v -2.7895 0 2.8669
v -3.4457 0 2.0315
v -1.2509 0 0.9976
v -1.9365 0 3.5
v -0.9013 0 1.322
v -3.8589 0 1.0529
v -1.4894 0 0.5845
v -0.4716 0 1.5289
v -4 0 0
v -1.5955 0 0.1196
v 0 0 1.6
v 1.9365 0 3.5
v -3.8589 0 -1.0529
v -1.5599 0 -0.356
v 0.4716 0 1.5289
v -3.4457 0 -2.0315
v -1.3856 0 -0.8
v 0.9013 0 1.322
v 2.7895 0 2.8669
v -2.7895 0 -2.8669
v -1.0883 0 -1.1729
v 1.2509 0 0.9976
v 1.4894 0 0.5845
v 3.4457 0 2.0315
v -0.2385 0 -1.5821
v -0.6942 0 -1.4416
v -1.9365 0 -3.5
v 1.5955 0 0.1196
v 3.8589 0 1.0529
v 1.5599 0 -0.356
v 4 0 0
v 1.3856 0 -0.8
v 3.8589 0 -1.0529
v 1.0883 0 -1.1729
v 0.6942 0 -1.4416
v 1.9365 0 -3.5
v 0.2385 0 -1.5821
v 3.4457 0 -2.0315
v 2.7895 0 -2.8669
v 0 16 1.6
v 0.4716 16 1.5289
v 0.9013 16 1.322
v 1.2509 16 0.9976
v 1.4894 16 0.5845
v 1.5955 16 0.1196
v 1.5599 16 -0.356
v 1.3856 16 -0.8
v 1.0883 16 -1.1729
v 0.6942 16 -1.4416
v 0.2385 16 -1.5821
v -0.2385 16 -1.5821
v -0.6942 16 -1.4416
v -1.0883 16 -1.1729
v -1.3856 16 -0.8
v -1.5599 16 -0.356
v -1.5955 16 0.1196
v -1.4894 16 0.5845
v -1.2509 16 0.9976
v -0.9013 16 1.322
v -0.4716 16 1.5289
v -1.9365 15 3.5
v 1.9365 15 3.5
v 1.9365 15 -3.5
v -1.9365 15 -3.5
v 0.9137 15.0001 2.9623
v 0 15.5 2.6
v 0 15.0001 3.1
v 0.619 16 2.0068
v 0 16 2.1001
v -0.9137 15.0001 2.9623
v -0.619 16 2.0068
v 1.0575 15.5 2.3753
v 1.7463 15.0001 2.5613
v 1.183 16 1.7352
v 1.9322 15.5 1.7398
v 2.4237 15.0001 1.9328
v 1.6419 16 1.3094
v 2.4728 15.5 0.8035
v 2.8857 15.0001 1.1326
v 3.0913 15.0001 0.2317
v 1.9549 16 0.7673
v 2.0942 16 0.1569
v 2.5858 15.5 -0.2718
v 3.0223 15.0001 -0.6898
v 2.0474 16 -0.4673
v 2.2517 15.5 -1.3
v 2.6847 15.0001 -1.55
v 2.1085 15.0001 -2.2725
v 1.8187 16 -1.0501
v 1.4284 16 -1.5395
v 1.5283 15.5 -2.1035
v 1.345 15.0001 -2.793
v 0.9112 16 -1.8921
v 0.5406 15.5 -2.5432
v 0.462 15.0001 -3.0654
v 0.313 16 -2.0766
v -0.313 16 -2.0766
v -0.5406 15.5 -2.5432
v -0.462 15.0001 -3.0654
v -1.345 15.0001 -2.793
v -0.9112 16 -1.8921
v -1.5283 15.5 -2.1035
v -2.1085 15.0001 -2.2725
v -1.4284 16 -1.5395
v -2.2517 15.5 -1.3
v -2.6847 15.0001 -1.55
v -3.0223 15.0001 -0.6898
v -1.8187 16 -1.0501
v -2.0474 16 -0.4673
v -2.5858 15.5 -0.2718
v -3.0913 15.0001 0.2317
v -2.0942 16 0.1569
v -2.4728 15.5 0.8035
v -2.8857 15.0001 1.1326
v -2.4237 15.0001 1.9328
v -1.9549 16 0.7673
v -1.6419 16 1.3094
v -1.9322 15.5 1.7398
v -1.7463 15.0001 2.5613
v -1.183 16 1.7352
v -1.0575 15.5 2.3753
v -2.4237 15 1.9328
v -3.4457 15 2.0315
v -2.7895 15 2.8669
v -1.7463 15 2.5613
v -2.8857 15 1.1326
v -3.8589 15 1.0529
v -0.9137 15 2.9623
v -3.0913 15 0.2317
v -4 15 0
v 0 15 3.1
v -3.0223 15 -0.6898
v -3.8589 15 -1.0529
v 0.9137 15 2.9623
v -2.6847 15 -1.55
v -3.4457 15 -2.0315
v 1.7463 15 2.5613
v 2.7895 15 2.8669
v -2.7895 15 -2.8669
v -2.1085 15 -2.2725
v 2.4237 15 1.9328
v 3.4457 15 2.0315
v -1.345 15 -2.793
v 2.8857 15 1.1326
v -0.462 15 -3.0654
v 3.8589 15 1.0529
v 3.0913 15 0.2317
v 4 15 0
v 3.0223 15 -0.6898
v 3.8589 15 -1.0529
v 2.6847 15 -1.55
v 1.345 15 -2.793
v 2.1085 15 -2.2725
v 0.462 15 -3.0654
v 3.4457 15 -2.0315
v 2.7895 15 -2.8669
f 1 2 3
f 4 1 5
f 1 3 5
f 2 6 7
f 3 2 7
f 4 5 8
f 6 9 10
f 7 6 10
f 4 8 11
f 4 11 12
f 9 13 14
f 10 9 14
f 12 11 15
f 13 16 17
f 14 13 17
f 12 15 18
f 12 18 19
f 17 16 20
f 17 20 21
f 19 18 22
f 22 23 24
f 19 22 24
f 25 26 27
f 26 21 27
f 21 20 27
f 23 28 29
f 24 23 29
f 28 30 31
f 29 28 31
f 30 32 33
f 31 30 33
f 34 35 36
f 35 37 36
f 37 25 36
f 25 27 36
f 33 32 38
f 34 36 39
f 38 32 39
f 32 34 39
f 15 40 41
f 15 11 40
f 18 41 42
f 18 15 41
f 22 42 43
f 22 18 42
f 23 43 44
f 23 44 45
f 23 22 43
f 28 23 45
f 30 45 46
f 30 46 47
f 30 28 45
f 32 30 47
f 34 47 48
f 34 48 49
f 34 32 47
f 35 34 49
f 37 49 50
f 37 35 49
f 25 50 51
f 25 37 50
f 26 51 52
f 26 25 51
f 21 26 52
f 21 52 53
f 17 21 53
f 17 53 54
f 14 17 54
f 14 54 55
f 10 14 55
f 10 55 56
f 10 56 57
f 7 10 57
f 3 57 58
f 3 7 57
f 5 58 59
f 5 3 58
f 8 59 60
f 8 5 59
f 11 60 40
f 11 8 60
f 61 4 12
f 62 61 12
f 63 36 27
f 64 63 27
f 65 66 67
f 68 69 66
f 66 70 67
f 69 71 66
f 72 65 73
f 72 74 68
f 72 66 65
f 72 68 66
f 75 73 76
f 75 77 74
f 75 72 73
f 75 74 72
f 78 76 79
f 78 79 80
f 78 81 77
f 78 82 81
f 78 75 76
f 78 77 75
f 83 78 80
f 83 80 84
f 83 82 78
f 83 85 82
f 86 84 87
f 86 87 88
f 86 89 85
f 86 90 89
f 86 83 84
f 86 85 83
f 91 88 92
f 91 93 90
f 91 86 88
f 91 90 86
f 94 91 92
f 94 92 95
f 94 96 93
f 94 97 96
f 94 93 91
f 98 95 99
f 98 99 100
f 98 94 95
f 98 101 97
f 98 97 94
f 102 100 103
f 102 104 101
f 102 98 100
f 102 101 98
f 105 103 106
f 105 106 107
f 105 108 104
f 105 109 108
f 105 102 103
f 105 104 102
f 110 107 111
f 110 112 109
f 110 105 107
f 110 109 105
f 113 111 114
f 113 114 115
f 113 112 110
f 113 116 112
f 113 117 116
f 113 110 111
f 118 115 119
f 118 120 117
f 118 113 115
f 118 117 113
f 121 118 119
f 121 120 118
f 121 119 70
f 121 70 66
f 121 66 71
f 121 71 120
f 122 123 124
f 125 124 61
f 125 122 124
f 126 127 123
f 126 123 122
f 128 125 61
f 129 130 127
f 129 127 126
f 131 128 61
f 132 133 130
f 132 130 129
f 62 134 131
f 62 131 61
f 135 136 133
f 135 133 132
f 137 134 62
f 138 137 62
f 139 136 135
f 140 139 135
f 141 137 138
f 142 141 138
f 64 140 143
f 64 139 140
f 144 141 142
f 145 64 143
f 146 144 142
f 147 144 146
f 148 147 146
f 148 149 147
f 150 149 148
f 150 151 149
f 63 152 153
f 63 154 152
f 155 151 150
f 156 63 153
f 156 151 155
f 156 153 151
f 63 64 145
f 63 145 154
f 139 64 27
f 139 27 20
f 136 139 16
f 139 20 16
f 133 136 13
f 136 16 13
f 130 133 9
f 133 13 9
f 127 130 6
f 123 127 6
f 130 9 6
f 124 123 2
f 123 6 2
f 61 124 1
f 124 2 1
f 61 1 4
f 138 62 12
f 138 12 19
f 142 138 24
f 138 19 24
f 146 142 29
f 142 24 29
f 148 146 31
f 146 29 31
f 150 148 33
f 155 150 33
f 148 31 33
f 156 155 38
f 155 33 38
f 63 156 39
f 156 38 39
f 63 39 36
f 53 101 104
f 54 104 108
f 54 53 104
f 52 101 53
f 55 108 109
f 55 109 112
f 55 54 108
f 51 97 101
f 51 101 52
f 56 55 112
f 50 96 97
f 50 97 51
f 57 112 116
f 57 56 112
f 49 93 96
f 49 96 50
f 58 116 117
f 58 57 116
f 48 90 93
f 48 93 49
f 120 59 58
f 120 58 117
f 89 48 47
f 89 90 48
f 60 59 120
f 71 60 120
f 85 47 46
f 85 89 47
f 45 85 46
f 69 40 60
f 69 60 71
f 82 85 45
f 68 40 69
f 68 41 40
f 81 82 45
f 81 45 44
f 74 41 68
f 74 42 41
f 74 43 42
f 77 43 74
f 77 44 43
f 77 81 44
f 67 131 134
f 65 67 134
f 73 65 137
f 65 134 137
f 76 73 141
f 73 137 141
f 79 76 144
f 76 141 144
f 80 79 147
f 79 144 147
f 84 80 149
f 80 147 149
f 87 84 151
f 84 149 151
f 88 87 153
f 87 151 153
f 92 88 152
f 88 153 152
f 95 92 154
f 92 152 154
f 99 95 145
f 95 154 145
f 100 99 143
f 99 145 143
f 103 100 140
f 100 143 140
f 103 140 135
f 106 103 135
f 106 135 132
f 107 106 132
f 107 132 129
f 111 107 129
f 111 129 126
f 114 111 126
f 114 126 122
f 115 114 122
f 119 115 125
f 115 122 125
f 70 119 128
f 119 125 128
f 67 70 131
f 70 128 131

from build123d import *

# Parameters (mm, degrees)
SKETCH1_R           = 1.6
BOSS_EXTRUDE1_DEPTH = 15
SKETCH2_R           = 3.1
SKETCH2_R_2         = 1.6
BOSS_EXTRUDE2_DEPTH = 1
CHAMFER1_SIZE       = 1


with BuildPart() as part:
    # Sketch1 → Boss-Extrude1 (new body)
    with BuildSketch(Plane(origin=(0, 0, 0), x_dir=(1, 0, 0), z_dir=(0, 1, 0))):
        with BuildLine():
            Line((-1.936491673, -3.5), (1.936491673, -3.5))
            ThreePointArc((1.936491673, -3.5), (4, 0), (1.936491673, 3.5))
            Line((1.936491673, 3.5), (-1.936491673, 3.5))
            ThreePointArc((-1.936491673, 3.5), (-4, 0), (-1.936491673, -3.5))
        make_face()
        with Locations(Location((0, 0, 0), (0, 0, 270))):
            Circle(SKETCH1_R, mode=Mode.SUBTRACT)
    extrude(amount=BOSS_EXTRUDE1_DEPTH)

    # Sketch2 → Boss-Extrude2 (add)
    with BuildSketch(Plane(origin=(0, 15, 0), x_dir=(1, 0, 0), z_dir=(0, 1, 0))):
        with Locations(Location((0, 0, 0), (0, 0, 270))):
            Circle(SKETCH2_R)
        with Locations(Location((0, 0, 0), (0, 0, 270))):
            Circle(SKETCH2_R_2, mode=Mode.SUBTRACT)
    extrude(amount=BOSS_EXTRUDE2_DEPTH)

    # Chamfer1
    chamfer1_edges = [part.edges().sort_by_distance(p)[0] for p in [
        (0, 16, -3.1),
    ]]
    chamfer(chamfer1_edges, length=CHAMFER1_SIZE - 0.0001)  # a hair under: the kernel refuses the full size


solid = part.part
